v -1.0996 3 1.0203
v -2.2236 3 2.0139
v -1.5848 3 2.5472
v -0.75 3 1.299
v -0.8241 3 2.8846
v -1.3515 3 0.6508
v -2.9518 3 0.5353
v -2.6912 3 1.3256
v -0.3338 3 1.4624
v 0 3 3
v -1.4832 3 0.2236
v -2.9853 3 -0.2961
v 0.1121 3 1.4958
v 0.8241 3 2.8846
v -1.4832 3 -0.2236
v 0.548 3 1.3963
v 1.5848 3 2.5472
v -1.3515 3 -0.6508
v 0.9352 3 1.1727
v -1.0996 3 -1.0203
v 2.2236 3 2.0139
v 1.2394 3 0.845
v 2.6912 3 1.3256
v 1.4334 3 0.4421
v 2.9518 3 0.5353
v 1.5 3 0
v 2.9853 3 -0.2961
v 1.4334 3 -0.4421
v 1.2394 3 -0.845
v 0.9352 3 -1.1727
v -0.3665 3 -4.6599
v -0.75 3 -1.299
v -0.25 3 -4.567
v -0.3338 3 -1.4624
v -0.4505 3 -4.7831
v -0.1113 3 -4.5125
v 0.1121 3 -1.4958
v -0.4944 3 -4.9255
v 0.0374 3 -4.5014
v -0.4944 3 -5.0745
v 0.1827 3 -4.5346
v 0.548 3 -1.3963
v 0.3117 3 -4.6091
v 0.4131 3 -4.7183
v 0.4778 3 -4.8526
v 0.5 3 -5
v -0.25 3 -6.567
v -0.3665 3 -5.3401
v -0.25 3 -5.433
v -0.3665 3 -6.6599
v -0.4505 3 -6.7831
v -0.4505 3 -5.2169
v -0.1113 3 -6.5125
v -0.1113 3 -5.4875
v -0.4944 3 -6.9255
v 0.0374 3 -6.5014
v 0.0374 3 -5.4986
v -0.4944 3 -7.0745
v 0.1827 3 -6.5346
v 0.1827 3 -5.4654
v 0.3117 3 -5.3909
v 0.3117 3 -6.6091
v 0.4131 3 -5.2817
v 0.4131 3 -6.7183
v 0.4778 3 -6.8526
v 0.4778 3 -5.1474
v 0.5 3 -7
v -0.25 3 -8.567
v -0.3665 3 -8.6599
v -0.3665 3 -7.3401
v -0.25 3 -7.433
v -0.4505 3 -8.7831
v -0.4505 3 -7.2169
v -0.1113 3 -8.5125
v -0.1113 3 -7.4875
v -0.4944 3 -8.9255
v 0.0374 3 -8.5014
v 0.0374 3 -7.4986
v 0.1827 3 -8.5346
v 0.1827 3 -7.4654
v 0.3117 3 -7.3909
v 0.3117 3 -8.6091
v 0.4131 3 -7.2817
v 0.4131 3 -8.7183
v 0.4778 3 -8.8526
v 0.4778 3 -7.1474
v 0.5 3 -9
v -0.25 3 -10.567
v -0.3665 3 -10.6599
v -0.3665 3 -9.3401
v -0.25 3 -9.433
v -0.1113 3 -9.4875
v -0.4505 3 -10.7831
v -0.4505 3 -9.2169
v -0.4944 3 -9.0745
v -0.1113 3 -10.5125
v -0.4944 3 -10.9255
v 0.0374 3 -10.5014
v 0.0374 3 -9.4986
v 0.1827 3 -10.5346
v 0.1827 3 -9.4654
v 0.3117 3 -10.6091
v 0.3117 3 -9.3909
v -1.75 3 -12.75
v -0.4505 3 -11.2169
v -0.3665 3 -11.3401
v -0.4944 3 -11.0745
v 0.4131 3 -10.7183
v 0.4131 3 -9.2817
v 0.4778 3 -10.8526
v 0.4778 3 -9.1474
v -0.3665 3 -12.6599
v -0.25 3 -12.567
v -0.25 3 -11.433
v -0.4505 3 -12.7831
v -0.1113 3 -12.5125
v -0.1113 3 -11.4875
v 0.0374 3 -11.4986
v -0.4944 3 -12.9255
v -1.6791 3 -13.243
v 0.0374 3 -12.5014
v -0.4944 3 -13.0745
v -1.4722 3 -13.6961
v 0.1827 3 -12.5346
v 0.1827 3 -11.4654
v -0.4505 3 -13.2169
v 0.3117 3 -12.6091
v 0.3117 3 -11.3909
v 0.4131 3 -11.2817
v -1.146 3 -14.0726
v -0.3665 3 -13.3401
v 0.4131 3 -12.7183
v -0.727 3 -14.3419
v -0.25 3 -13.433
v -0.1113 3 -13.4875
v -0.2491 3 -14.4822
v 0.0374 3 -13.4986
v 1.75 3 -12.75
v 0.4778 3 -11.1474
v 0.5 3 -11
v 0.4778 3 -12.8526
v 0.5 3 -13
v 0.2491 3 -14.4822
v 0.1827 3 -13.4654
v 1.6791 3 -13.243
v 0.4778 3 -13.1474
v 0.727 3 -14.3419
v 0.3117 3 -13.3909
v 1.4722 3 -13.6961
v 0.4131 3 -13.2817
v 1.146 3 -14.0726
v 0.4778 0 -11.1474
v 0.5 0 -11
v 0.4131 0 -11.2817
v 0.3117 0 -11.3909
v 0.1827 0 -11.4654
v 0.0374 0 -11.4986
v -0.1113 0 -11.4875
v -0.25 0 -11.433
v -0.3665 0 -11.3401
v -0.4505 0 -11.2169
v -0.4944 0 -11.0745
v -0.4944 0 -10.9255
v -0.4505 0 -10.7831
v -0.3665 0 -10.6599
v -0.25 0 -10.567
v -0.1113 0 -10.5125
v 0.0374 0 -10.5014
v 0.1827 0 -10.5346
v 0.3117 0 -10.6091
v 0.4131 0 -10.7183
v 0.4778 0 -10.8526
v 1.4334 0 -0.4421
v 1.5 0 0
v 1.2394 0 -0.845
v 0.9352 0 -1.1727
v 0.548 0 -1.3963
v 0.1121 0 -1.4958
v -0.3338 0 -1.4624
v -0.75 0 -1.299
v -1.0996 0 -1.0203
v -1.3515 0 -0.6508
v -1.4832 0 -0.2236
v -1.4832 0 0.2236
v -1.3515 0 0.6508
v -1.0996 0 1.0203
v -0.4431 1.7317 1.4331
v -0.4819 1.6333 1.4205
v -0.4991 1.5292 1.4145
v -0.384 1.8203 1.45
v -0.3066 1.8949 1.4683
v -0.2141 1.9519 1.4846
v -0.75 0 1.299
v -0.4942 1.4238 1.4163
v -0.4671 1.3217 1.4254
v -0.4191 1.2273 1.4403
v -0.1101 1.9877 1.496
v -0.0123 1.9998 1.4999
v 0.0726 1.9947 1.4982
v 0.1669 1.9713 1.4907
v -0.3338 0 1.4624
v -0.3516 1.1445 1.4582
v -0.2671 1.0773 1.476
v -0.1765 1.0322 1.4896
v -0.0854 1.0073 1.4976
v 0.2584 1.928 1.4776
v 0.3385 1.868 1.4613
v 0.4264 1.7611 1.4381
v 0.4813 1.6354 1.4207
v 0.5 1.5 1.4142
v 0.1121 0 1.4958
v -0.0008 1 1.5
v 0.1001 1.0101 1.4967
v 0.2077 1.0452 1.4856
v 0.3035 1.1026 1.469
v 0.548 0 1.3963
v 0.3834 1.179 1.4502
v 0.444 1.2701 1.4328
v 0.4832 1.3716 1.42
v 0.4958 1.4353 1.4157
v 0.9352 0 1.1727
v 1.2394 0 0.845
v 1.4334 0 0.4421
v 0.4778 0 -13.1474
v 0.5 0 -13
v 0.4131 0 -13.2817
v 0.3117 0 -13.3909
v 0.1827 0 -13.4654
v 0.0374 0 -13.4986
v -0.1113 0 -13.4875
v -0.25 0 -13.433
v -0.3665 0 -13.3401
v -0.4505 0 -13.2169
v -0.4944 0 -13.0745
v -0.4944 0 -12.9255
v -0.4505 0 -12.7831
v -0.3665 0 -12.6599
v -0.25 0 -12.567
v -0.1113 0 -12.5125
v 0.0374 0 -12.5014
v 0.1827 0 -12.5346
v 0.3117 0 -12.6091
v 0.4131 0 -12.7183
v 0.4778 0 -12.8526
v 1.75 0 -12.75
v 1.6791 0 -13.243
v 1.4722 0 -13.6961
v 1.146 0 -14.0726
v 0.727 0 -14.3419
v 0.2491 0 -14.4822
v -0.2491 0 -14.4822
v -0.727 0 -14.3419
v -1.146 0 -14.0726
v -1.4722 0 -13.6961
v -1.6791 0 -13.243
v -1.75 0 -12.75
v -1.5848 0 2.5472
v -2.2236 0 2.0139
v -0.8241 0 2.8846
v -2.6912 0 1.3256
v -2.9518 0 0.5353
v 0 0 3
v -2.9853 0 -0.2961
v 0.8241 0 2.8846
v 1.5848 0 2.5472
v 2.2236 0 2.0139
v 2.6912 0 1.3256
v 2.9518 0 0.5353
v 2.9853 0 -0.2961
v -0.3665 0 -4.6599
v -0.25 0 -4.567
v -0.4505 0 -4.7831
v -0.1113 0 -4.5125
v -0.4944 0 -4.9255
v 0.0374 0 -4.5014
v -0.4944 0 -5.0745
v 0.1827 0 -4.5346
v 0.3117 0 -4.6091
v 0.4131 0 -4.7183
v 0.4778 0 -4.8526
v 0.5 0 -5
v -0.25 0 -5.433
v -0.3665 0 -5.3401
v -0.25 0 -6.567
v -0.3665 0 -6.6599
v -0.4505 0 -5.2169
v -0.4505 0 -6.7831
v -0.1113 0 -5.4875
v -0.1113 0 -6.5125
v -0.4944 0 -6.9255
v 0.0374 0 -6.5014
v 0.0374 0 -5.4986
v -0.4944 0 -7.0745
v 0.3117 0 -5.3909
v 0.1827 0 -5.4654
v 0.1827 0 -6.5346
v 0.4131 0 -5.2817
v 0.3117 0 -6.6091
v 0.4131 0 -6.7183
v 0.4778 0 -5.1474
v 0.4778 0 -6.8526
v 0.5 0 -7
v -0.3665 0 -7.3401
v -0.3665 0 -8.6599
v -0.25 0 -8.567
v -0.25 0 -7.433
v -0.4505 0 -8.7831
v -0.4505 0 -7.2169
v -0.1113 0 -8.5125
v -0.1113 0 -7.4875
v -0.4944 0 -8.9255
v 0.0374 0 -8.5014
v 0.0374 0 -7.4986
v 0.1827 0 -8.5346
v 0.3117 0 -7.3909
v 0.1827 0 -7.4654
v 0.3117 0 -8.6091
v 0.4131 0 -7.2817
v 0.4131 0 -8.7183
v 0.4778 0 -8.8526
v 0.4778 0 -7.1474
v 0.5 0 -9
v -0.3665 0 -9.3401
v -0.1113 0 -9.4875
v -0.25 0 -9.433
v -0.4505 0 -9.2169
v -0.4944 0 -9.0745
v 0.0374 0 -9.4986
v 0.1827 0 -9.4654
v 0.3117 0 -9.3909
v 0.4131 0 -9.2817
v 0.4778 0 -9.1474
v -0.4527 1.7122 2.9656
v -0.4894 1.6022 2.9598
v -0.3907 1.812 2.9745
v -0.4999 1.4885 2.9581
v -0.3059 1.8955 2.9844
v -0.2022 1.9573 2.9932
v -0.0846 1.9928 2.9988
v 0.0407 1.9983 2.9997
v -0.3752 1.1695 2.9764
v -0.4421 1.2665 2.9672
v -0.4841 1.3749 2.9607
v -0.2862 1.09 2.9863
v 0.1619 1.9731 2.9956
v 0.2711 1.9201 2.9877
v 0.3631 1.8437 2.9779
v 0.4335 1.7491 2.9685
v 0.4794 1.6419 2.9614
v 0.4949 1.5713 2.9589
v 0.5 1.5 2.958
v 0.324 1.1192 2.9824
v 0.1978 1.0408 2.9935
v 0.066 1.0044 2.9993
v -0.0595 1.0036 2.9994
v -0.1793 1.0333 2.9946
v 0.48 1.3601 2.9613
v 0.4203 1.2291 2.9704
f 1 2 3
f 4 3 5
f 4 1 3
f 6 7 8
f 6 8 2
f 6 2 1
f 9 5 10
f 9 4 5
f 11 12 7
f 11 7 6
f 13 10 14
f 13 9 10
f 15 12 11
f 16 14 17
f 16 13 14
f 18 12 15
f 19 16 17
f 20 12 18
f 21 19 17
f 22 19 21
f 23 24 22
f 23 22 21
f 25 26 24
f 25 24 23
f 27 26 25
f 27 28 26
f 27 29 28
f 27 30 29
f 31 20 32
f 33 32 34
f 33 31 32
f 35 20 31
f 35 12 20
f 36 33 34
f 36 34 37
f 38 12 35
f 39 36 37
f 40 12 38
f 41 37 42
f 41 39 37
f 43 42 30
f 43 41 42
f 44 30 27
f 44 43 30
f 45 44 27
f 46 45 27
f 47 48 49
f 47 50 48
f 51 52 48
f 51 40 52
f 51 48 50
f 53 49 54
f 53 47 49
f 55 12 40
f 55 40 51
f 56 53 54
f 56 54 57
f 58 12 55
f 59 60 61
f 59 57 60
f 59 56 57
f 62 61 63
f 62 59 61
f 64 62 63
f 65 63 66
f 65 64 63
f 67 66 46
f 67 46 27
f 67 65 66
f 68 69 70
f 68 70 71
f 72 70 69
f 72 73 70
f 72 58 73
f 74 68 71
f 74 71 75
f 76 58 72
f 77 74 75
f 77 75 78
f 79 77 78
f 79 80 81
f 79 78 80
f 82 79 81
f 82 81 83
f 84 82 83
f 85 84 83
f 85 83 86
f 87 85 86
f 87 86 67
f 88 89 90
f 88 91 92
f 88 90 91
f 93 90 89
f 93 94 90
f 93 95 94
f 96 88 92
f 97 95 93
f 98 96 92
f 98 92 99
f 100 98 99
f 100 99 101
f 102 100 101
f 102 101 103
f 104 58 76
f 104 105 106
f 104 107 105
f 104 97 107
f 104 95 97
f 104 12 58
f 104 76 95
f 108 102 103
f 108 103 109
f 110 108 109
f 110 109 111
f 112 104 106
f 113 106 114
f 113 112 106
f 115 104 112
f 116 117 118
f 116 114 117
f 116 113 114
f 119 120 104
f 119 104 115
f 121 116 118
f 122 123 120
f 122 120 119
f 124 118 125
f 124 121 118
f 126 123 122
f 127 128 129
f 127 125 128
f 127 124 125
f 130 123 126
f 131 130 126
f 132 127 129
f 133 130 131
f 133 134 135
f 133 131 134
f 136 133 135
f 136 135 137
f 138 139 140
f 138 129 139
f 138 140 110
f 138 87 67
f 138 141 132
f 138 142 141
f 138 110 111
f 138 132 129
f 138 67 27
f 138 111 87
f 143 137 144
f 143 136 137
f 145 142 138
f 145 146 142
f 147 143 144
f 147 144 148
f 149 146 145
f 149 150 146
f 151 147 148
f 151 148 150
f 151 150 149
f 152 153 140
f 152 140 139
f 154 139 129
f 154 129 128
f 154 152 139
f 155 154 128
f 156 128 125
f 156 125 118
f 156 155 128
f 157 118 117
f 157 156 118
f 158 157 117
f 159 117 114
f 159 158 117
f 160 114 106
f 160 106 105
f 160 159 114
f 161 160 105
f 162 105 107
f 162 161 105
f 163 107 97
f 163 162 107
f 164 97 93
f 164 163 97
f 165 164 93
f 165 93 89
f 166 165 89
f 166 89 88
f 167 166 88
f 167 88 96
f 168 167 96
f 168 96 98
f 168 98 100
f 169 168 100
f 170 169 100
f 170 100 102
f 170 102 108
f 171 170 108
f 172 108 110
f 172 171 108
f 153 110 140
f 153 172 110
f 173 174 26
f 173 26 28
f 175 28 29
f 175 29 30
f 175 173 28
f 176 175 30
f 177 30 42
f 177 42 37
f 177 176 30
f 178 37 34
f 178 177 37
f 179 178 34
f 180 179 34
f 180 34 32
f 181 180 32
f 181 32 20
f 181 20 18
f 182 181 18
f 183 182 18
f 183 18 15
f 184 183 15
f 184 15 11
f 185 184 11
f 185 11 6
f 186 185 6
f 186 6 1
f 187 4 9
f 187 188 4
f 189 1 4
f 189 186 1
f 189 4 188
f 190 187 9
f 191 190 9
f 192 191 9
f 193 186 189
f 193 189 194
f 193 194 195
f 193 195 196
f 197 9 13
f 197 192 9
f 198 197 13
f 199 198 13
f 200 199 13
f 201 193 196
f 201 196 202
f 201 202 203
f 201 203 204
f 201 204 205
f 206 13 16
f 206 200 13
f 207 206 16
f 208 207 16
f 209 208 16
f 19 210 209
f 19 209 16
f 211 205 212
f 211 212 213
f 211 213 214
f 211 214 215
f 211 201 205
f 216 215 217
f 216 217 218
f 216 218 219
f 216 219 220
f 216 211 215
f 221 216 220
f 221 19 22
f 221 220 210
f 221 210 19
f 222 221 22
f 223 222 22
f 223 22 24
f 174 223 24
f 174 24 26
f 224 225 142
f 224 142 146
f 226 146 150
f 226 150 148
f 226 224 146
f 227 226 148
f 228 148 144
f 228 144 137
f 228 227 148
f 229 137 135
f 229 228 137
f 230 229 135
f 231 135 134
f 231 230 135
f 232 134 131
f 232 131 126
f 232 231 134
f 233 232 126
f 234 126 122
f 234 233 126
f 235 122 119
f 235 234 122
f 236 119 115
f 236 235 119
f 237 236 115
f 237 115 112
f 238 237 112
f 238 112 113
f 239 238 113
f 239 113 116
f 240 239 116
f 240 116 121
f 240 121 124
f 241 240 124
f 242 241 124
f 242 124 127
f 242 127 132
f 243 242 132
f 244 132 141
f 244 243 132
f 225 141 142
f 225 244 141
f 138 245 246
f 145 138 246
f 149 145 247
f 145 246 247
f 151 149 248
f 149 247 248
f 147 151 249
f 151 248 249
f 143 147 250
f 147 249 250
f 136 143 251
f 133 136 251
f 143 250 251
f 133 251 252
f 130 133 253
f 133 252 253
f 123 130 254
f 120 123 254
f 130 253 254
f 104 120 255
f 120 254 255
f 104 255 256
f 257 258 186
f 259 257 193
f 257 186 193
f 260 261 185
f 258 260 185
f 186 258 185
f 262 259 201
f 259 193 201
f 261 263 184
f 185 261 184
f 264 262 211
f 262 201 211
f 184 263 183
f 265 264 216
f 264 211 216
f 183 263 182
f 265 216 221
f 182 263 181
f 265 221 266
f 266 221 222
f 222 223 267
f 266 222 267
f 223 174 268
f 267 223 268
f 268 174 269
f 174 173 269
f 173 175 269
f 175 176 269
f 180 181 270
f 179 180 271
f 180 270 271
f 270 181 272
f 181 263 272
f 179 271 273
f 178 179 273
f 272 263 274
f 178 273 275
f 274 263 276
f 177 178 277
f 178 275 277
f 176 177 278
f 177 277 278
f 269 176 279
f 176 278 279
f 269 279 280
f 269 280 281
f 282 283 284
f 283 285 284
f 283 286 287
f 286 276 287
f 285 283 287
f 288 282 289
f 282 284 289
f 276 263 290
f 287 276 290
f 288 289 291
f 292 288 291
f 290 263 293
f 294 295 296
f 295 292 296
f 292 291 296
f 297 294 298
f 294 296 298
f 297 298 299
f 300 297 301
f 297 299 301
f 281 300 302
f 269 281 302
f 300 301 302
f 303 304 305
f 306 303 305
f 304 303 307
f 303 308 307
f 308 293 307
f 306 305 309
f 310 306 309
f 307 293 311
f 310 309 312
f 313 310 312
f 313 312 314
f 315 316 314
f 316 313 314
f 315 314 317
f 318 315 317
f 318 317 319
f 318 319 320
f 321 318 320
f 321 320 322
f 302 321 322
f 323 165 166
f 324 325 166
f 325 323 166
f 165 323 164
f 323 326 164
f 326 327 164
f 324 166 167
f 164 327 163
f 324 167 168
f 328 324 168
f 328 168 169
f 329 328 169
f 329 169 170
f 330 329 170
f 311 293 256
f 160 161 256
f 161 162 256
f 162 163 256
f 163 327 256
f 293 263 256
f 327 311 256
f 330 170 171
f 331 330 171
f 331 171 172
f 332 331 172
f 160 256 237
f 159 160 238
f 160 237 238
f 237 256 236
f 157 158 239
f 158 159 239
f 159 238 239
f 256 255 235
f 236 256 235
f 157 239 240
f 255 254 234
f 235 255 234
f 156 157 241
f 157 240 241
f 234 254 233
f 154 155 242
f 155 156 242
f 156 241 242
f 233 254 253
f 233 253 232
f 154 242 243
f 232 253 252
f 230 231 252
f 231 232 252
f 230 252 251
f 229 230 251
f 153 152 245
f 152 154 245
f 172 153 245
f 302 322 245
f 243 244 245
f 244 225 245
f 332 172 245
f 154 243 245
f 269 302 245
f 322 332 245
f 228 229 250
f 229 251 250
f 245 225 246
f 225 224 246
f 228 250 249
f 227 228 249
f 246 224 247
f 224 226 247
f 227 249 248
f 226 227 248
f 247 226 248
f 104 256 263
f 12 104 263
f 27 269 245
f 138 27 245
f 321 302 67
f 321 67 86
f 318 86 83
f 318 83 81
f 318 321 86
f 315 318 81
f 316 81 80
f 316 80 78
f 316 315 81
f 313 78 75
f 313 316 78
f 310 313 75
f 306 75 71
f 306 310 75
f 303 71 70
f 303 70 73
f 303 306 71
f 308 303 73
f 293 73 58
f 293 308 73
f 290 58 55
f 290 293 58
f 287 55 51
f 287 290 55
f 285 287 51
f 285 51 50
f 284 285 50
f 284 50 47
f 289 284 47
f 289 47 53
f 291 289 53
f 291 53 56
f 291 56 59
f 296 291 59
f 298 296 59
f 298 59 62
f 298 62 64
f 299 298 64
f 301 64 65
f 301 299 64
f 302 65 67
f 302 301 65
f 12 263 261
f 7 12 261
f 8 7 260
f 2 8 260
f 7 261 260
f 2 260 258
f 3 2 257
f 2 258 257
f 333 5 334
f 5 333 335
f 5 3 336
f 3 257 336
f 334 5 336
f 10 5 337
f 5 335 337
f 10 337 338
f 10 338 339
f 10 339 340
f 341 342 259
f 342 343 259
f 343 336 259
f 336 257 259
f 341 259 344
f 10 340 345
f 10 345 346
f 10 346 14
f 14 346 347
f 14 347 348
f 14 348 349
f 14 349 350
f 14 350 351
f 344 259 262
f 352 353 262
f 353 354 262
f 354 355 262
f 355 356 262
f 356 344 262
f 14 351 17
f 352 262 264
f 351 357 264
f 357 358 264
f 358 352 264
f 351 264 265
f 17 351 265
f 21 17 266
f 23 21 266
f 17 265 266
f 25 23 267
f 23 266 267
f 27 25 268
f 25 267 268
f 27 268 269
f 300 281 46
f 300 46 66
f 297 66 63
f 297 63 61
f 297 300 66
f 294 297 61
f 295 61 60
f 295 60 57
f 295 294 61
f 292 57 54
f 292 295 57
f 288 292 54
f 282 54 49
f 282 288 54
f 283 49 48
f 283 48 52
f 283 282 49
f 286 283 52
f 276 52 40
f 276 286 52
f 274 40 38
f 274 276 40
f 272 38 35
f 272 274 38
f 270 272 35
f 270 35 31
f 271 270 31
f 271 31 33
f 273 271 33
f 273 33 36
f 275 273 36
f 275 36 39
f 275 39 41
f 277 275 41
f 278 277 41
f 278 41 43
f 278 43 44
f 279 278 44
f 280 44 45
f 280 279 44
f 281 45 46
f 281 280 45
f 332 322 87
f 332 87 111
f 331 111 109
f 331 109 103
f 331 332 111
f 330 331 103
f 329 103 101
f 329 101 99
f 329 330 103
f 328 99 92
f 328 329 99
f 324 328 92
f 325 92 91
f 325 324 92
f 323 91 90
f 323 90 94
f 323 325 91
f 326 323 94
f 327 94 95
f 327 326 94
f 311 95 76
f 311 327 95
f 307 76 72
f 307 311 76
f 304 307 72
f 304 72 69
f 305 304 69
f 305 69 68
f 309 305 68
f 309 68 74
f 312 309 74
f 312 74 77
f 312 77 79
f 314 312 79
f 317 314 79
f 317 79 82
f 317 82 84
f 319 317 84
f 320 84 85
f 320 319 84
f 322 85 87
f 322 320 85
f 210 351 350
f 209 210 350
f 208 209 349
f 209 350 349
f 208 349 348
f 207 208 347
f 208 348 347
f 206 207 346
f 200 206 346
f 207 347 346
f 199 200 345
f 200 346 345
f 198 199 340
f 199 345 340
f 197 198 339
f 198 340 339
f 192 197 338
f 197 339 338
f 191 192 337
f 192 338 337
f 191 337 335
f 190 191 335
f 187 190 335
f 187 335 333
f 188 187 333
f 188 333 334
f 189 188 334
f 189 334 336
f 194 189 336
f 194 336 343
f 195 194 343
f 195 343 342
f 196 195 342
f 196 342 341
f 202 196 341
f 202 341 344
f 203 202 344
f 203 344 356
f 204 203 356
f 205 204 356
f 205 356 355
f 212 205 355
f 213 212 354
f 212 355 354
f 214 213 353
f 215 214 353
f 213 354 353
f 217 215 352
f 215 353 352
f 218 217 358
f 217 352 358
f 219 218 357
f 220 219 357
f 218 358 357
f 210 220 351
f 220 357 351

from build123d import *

# Parameters (mm, degrees)
SKETCH1_R           = 1.5
SKETCH1_R_2         = 0.5
BOSS_EXTRUDE1_DEPTH = 3
SKETCH2_R           = 0.5
CUT_EXTRUDE1_DEPTH  = 3


with BuildPart() as part:
    # Sketch1 → Boss-Extrude1 (new body)
    with BuildSketch(Plane(origin=(0, 0, 0), x_dir=(1, 0, 0), z_dir=(0, 1, 0))):
        with BuildLine():
            Line((-1.75, 12.75), (-2.985348867, 0.296128587))
            ThreePointArc((-2.985348867, 0.296128587), (0, -3), (2.985348867, 0.296128587))
            Line((2.985348867, 0.296128587), (1.75, 12.75))
            ThreePointArc((1.75, 12.75), (0, 14.5), (-1.75, 12.75))
        make_face()
        Circle(SKETCH1_R, mode=Mode.SUBTRACT)
        with Locations((0, 5)):
            Circle(SKETCH1_R_2, mode=Mode.SUBTRACT)
        with Locations((0, 7)):
            Circle(SKETCH1_R_2, mode=Mode.SUBTRACT)
        with Locations((0, 9)):
            Circle(SKETCH1_R_2, mode=Mode.SUBTRACT)
        with Locations((0, 11)):
            Circle(SKETCH1_R_2, mode=Mode.SUBTRACT)
        with Locations((0, 13)):
            Circle(SKETCH1_R_2, mode=Mode.SUBTRACT)
    extrude(amount=BOSS_EXTRUDE1_DEPTH)

    # Sketch2 → Cut-Extrude1 (cut)
    with BuildSketch(Plane.XY.offset(3)):
        with Locations((0, 1.5)):
            Circle(SKETCH2_R)
    extrude(amount=-CUT_EXTRUDE1_DEPTH, mode=Mode.SUBTRACT)


solid = part.part
